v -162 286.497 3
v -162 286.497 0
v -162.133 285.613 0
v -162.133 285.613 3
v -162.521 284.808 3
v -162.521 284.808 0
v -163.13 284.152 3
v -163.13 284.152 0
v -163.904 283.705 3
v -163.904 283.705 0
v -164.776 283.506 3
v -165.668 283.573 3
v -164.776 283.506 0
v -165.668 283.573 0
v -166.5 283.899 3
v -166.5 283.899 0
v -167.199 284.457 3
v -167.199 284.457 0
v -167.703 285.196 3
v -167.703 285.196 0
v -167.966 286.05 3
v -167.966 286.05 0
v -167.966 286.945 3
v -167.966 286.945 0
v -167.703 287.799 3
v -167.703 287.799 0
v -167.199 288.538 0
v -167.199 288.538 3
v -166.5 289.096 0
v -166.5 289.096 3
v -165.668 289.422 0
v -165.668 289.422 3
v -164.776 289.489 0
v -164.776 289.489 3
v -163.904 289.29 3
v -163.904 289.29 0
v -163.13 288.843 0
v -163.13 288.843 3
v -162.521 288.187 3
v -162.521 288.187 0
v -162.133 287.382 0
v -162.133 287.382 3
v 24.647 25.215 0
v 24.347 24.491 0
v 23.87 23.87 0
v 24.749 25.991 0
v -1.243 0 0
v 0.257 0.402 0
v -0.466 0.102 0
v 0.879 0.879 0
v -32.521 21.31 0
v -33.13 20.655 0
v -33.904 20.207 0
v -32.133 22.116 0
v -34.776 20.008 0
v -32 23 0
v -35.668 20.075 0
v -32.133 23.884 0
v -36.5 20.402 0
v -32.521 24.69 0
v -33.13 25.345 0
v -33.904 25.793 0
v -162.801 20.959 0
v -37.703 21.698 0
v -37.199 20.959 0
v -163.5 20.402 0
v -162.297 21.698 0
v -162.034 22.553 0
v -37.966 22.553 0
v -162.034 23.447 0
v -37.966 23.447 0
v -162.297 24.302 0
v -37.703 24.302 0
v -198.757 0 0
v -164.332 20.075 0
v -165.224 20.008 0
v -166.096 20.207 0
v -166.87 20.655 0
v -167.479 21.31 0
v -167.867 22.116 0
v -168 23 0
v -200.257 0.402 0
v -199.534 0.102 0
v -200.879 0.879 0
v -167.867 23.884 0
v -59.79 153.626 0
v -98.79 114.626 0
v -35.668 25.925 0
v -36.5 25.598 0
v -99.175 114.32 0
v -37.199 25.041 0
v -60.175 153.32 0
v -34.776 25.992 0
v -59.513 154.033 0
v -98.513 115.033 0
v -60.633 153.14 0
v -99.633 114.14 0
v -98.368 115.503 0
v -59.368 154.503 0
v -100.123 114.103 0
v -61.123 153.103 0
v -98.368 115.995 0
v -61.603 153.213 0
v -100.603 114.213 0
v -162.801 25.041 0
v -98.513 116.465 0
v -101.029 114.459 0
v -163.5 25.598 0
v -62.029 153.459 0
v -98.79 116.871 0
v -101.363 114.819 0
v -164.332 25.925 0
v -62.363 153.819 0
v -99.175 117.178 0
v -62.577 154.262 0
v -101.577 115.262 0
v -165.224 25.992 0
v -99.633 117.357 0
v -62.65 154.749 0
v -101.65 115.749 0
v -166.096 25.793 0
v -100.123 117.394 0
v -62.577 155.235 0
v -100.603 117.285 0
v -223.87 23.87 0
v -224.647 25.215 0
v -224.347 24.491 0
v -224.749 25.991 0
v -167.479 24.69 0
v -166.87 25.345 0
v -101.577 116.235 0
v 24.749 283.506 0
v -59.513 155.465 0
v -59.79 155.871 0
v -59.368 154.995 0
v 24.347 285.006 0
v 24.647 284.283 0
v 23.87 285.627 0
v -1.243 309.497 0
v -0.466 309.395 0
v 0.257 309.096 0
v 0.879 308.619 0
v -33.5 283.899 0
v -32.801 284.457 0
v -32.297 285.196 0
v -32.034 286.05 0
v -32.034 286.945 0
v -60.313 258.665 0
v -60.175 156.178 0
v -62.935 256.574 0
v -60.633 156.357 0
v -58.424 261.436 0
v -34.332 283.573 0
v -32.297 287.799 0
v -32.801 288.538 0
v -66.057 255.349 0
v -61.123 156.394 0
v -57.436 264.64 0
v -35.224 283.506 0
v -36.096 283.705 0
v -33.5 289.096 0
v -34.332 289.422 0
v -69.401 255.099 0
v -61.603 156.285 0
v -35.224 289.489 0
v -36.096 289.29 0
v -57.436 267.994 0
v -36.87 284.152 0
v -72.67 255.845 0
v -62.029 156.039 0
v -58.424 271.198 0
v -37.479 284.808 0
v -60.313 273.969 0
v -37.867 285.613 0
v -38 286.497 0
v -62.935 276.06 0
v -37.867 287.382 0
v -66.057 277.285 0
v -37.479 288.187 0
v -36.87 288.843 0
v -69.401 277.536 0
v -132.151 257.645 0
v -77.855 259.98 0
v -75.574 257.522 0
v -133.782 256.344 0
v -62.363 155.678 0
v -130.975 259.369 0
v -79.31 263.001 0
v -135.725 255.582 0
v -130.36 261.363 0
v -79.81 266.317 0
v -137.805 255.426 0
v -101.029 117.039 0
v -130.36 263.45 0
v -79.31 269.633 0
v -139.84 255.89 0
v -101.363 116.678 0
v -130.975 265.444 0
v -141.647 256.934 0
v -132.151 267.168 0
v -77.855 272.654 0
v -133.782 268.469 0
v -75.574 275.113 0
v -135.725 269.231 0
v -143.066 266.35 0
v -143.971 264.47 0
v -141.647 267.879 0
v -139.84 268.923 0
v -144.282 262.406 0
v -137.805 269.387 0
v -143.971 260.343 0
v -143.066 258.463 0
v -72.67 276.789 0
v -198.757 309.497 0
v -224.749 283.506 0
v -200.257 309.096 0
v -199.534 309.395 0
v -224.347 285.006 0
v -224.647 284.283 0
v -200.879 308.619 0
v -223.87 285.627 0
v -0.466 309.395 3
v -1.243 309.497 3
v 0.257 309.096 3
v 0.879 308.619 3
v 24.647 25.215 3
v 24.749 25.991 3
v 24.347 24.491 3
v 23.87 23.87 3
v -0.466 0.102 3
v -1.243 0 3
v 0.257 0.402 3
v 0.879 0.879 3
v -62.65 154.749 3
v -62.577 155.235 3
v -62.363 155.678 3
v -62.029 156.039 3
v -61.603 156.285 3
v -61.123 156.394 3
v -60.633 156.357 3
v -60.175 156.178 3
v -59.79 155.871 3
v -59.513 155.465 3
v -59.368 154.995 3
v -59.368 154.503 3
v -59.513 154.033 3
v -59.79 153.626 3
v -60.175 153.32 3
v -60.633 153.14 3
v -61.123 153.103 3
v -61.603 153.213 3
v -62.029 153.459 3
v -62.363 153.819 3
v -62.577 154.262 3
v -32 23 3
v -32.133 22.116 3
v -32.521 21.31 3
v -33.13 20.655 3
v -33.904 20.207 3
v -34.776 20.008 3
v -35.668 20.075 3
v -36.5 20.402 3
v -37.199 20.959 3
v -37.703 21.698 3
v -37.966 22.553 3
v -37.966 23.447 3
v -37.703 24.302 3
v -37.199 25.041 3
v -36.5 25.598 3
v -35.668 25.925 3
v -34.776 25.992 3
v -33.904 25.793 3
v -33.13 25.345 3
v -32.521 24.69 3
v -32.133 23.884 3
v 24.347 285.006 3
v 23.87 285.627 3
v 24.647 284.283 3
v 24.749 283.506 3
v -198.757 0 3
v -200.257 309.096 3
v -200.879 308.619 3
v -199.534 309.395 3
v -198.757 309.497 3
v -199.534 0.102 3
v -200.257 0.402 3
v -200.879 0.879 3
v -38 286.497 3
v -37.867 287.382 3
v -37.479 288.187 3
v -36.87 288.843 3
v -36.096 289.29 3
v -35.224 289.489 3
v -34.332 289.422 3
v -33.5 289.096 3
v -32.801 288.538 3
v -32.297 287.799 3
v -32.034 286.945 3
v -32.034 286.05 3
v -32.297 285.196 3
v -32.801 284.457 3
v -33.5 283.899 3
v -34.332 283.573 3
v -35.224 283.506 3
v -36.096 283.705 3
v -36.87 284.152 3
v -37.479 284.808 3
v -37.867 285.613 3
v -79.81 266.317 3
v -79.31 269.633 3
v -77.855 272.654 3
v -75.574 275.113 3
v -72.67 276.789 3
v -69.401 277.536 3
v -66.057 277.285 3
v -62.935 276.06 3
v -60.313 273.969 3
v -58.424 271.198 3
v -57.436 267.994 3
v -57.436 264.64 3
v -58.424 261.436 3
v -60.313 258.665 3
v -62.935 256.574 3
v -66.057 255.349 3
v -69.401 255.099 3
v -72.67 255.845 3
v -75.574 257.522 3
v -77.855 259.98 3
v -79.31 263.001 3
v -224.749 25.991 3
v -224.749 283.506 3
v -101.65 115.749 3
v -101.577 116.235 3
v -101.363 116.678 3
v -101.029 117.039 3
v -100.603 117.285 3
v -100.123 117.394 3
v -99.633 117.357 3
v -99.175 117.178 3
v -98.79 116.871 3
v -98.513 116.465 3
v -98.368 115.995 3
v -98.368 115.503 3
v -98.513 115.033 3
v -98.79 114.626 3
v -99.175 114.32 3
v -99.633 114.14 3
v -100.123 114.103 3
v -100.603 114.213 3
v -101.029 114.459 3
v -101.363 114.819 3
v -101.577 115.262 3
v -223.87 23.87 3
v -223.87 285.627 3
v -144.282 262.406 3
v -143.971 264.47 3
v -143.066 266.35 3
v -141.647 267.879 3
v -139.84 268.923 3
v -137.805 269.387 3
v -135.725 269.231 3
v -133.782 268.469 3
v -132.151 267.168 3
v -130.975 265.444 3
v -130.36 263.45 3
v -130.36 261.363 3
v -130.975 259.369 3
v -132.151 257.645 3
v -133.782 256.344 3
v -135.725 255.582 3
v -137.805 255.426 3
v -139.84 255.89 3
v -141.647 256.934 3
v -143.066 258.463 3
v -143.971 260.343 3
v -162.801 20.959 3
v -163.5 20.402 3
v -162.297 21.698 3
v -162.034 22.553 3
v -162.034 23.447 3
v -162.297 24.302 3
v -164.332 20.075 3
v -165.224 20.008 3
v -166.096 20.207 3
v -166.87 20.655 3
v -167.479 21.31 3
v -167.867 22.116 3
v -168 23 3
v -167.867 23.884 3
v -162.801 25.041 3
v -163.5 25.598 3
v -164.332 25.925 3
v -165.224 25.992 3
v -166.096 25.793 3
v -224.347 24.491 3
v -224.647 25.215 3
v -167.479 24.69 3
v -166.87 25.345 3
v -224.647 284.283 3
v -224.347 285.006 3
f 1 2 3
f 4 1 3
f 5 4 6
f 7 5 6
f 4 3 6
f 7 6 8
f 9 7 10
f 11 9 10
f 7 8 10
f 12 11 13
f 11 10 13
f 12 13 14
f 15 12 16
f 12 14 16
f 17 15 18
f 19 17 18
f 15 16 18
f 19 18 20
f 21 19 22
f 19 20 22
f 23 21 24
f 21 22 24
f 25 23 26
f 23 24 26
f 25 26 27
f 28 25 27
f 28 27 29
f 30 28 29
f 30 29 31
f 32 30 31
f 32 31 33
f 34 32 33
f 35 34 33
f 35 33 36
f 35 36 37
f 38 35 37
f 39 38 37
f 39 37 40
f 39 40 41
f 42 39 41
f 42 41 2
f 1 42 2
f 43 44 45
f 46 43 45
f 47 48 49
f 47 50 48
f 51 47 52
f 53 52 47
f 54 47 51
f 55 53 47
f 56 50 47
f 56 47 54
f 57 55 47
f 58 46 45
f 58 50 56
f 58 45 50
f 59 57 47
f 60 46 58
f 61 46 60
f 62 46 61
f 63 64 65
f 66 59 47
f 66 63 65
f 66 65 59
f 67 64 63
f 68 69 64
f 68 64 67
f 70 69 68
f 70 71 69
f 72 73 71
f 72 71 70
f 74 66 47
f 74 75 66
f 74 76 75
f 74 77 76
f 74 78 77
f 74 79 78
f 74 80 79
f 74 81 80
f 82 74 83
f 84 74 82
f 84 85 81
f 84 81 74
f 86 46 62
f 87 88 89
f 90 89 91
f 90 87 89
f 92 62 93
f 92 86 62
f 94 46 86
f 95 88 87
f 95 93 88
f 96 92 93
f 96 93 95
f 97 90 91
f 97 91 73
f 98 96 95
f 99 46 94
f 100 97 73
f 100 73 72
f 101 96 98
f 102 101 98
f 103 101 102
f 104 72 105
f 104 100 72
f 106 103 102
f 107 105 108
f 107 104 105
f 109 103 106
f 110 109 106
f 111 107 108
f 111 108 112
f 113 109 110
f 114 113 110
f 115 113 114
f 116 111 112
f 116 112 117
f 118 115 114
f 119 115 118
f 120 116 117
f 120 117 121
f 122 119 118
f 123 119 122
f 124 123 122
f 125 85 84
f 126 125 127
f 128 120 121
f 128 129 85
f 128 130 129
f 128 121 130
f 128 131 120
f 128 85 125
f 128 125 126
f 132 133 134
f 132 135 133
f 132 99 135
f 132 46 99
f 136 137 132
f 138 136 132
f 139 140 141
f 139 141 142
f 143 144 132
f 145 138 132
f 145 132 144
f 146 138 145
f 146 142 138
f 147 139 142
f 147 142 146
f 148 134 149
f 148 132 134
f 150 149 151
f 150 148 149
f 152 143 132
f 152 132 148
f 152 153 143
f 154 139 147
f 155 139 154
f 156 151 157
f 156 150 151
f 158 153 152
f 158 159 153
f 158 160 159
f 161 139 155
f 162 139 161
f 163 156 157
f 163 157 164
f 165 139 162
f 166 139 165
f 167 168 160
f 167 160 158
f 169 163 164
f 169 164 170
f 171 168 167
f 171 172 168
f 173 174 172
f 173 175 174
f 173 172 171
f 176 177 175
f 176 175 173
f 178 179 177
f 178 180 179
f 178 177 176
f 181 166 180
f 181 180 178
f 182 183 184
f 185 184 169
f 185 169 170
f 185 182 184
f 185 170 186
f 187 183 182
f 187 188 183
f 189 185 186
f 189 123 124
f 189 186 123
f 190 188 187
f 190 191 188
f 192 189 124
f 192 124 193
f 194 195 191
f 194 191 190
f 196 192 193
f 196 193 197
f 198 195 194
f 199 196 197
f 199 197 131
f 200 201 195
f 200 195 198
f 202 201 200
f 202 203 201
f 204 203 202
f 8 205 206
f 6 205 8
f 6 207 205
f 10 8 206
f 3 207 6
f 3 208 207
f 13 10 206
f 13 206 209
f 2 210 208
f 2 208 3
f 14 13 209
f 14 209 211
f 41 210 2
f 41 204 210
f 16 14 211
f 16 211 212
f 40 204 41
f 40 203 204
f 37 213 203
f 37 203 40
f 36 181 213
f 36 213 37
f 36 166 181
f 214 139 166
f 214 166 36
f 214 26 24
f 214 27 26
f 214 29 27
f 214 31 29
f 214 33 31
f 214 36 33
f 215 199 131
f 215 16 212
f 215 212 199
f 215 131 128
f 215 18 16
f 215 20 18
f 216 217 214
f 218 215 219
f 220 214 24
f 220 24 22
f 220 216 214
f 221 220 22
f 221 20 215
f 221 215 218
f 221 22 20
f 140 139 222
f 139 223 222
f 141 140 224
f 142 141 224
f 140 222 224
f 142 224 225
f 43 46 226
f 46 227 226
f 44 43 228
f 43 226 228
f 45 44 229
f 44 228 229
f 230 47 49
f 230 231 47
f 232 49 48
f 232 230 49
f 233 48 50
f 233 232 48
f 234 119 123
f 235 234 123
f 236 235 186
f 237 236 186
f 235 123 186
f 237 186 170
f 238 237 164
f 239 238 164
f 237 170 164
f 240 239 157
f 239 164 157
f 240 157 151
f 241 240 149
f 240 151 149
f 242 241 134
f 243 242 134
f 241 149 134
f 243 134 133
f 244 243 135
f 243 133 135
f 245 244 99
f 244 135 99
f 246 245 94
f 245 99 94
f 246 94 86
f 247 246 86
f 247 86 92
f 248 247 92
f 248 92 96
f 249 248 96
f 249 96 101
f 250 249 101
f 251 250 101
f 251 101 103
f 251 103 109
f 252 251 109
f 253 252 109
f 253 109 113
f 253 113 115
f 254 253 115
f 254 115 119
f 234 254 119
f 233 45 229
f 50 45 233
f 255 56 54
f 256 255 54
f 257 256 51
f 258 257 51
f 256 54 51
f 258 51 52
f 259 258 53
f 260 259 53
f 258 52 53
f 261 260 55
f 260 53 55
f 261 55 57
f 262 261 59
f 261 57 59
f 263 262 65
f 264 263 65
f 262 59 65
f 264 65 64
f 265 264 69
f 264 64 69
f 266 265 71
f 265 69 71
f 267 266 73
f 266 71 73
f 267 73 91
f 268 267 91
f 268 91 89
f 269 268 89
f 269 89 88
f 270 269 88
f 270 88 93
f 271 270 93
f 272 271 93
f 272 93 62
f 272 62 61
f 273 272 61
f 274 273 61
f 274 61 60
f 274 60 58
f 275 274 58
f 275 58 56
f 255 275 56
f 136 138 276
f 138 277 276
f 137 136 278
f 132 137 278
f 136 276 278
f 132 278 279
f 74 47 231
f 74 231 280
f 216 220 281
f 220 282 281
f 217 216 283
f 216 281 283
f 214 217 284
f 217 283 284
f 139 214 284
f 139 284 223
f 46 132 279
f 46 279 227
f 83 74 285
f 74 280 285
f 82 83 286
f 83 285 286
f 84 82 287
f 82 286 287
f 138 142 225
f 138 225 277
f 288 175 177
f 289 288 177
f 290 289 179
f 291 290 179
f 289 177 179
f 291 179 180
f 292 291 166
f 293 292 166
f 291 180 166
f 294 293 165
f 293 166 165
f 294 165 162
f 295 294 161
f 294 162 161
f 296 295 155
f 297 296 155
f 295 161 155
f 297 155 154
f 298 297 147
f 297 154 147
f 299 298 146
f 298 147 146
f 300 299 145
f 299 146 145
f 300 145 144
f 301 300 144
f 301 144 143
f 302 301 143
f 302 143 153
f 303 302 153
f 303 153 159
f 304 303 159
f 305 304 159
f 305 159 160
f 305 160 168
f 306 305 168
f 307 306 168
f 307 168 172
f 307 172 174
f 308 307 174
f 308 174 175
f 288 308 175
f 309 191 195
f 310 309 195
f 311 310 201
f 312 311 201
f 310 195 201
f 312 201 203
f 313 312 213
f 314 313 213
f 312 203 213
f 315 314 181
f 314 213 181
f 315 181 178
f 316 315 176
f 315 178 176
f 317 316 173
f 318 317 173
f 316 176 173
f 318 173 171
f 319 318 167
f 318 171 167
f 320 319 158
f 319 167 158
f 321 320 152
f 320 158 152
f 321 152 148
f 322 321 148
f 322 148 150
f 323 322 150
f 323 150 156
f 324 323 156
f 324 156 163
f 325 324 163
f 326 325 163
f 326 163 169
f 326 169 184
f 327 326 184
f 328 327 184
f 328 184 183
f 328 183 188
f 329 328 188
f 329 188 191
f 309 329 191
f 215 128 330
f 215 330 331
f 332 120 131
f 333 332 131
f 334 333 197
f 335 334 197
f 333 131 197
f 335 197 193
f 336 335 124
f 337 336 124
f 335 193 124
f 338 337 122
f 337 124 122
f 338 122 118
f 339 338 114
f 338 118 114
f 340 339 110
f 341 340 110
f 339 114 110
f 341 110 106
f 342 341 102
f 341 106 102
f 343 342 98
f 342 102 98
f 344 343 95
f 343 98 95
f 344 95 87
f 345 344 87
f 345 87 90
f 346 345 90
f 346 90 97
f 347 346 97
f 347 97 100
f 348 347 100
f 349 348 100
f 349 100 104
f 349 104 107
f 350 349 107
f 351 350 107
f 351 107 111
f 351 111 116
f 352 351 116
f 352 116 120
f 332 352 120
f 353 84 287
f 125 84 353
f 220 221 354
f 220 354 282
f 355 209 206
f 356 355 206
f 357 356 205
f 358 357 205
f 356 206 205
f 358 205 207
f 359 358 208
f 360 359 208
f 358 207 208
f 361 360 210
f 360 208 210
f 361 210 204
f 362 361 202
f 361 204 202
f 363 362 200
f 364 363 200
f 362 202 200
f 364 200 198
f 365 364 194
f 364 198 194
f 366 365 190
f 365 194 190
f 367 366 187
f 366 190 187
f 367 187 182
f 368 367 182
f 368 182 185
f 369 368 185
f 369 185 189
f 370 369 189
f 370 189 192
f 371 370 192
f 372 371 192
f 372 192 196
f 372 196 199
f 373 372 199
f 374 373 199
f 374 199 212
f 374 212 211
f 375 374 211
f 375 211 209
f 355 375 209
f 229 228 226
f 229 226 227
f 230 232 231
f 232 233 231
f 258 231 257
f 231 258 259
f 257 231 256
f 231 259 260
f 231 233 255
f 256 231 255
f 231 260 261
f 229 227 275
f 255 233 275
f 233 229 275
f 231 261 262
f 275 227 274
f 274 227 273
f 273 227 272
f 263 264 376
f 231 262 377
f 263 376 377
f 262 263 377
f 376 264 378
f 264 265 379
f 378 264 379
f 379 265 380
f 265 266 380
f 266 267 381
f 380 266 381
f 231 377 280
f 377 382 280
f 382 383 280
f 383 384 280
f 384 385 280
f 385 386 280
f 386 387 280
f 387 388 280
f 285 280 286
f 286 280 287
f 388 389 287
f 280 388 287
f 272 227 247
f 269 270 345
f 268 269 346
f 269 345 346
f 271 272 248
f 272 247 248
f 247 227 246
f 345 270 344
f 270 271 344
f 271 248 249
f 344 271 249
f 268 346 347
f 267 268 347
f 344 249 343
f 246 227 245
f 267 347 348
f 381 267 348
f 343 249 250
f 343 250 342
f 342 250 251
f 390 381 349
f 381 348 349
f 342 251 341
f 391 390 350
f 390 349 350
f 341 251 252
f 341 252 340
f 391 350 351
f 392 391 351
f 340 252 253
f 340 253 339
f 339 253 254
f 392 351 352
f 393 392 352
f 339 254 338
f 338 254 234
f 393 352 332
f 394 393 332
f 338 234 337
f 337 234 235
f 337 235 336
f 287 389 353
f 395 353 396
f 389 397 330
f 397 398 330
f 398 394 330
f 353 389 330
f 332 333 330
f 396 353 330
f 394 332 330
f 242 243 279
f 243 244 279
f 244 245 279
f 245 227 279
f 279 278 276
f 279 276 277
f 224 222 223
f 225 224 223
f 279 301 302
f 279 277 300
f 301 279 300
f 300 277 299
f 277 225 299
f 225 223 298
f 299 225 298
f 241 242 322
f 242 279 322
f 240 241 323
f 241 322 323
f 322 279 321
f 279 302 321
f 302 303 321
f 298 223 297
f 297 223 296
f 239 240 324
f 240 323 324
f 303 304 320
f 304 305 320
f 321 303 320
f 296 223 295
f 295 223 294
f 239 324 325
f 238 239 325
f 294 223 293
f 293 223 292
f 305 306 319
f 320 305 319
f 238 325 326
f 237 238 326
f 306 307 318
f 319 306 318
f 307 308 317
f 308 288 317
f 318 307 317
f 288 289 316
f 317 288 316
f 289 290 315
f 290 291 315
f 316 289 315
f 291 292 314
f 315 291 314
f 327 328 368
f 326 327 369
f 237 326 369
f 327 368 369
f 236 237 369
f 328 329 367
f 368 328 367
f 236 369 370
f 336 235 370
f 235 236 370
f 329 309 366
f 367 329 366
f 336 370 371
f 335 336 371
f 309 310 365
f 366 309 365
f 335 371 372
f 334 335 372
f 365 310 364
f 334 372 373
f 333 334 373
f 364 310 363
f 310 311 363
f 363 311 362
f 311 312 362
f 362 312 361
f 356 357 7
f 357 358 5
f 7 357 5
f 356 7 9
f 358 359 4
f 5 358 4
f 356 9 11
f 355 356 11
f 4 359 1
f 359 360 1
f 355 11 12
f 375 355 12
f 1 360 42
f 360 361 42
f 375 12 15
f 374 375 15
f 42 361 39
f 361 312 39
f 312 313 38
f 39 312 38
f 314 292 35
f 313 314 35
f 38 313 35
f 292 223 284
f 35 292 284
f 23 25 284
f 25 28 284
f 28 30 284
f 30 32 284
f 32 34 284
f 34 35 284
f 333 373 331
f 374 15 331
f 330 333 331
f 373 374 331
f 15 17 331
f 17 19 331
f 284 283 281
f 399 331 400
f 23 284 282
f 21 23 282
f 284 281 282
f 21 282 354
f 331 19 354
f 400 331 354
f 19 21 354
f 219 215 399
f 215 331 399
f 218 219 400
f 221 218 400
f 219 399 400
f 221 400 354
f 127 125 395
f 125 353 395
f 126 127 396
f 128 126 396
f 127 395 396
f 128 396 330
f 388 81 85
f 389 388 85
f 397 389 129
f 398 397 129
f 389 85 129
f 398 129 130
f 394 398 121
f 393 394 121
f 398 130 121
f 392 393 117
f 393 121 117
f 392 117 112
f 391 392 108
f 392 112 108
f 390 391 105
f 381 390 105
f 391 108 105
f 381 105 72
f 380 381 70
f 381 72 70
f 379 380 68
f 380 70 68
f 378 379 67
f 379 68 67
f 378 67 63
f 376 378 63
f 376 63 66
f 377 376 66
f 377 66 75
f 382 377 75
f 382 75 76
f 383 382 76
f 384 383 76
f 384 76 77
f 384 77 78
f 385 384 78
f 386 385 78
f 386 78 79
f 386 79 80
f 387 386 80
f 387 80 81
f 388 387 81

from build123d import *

# Parameters (mm, degrees)
BASE_DEPTH              = 3
CONG_1_R                = 3
ESQUISSE20_R            = 3
PERCAGE_PROFIL_S_DEPTH  = 383.50448595
ESQUISSE21_R            = 1.65
PERCAGE_LIDAR_DEPTH     = 383.50448595
ESQUISSE22_R            = 11.25
ENL_V_MAT_EXTRU_3_DEPTH = 383.50448595
ESQUISSE23_R            = 7
ENL_V_MAT_EXTRU_4_DEPTH = 383.50448595


with BuildPart() as part:
    # Esquisse1 → Base (new body)
    with BuildSketch(Plane.XY):
        Polygon((0, 0), (-200, 0), (-224.748737342, 24.748737342), (-224.748737342, 284.748737342), (-200, 309.497474683), (0, 309.497474683), (24.748737342, 284.748737342), (24.748737342, 24.748737342), align=None)
    extrude(amount=BASE_DEPTH)

    # Congé1
    cong_1_edges = [part.edges().sort_by_distance(p)[0] for p in [
        (0, 0, 1.5),
        (-200, 0, 1.5),
        (-224.748737342, 24.748737342, 1.5),
        (-224.748737342, 284.748737342, 1.5),
        (-200, 309.497474683, 1.5),
        (0, 309.497474683, 1.5),
        (24.748737342, 284.748737342, 1.5),
        (24.748737342, 24.748737342, 1.5),
    ]]
    fillet(cong_1_edges, radius=CONG_1_R)

    # Esquisse20 → Percage Profilés (cut, through all)
    with BuildSketch(Plane(origin=(0, 0, 0), x_dir=(-1, 0, 0), z_dir=(0, 0, -1))):
        with Locations((35, 286.497474683)):
            Circle(ESQUISSE20_R)
        with Locations(Location((165, 286.497474683, 0), (0, 0, 180))):
            Circle(ESQUISSE20_R)
        with Locations((165, 23)):
            Circle(ESQUISSE20_R)
        with Locations(Location((35, 23, 0), (0, 0, 180))):
            Circle(ESQUISSE20_R)
    extrude(amount=-PERCAGE_PROFIL_S_DEPTH, mode=Mode.SUBTRACT)

    # Esquisse21 → Percage Lidar (cut, through all)
    with BuildSketch(Plane(origin=(0, 0, 0), x_dir=(-1, 0, 0), z_dir=(0, 0, -1))):
        with Locations((61, 154.748737342)):
            Circle(ESQUISSE21_R)
        with Locations((100, 115.748737342)):
            Circle(ESQUISSE21_R)
    extrude(amount=-PERCAGE_LIDAR_DEPTH, mode=Mode.SUBTRACT)

    # Esquisse22 → Enlèv. mat.-Extru.3 (cut, through all)
    with BuildSketch(Plane(origin=(0, 0, 0), x_dir=(-1, 0, 0), z_dir=(0, 0, -1))):
        with Locations((68.560025138, 266.317142531)):
            Circle(ESQUISSE22_R)
    extrude(amount=-ENL_V_MAT_EXTRU_3_DEPTH, mode=Mode.SUBTRACT)

    # Esquisse23 → Enlèv. mat.-Extru.4 (cut, through all)
    with BuildSketch(Plane(origin=(0, 0, 0), x_dir=(-1, 0, 0), z_dir=(0, 0, -1))):
        with Locations((137.282259715, 262.406498542)):
            Circle(ESQUISSE23_R)
    extrude(amount=-ENL_V_MAT_EXTRU_4_DEPTH, mode=Mode.SUBTRACT)


solid = part.part
